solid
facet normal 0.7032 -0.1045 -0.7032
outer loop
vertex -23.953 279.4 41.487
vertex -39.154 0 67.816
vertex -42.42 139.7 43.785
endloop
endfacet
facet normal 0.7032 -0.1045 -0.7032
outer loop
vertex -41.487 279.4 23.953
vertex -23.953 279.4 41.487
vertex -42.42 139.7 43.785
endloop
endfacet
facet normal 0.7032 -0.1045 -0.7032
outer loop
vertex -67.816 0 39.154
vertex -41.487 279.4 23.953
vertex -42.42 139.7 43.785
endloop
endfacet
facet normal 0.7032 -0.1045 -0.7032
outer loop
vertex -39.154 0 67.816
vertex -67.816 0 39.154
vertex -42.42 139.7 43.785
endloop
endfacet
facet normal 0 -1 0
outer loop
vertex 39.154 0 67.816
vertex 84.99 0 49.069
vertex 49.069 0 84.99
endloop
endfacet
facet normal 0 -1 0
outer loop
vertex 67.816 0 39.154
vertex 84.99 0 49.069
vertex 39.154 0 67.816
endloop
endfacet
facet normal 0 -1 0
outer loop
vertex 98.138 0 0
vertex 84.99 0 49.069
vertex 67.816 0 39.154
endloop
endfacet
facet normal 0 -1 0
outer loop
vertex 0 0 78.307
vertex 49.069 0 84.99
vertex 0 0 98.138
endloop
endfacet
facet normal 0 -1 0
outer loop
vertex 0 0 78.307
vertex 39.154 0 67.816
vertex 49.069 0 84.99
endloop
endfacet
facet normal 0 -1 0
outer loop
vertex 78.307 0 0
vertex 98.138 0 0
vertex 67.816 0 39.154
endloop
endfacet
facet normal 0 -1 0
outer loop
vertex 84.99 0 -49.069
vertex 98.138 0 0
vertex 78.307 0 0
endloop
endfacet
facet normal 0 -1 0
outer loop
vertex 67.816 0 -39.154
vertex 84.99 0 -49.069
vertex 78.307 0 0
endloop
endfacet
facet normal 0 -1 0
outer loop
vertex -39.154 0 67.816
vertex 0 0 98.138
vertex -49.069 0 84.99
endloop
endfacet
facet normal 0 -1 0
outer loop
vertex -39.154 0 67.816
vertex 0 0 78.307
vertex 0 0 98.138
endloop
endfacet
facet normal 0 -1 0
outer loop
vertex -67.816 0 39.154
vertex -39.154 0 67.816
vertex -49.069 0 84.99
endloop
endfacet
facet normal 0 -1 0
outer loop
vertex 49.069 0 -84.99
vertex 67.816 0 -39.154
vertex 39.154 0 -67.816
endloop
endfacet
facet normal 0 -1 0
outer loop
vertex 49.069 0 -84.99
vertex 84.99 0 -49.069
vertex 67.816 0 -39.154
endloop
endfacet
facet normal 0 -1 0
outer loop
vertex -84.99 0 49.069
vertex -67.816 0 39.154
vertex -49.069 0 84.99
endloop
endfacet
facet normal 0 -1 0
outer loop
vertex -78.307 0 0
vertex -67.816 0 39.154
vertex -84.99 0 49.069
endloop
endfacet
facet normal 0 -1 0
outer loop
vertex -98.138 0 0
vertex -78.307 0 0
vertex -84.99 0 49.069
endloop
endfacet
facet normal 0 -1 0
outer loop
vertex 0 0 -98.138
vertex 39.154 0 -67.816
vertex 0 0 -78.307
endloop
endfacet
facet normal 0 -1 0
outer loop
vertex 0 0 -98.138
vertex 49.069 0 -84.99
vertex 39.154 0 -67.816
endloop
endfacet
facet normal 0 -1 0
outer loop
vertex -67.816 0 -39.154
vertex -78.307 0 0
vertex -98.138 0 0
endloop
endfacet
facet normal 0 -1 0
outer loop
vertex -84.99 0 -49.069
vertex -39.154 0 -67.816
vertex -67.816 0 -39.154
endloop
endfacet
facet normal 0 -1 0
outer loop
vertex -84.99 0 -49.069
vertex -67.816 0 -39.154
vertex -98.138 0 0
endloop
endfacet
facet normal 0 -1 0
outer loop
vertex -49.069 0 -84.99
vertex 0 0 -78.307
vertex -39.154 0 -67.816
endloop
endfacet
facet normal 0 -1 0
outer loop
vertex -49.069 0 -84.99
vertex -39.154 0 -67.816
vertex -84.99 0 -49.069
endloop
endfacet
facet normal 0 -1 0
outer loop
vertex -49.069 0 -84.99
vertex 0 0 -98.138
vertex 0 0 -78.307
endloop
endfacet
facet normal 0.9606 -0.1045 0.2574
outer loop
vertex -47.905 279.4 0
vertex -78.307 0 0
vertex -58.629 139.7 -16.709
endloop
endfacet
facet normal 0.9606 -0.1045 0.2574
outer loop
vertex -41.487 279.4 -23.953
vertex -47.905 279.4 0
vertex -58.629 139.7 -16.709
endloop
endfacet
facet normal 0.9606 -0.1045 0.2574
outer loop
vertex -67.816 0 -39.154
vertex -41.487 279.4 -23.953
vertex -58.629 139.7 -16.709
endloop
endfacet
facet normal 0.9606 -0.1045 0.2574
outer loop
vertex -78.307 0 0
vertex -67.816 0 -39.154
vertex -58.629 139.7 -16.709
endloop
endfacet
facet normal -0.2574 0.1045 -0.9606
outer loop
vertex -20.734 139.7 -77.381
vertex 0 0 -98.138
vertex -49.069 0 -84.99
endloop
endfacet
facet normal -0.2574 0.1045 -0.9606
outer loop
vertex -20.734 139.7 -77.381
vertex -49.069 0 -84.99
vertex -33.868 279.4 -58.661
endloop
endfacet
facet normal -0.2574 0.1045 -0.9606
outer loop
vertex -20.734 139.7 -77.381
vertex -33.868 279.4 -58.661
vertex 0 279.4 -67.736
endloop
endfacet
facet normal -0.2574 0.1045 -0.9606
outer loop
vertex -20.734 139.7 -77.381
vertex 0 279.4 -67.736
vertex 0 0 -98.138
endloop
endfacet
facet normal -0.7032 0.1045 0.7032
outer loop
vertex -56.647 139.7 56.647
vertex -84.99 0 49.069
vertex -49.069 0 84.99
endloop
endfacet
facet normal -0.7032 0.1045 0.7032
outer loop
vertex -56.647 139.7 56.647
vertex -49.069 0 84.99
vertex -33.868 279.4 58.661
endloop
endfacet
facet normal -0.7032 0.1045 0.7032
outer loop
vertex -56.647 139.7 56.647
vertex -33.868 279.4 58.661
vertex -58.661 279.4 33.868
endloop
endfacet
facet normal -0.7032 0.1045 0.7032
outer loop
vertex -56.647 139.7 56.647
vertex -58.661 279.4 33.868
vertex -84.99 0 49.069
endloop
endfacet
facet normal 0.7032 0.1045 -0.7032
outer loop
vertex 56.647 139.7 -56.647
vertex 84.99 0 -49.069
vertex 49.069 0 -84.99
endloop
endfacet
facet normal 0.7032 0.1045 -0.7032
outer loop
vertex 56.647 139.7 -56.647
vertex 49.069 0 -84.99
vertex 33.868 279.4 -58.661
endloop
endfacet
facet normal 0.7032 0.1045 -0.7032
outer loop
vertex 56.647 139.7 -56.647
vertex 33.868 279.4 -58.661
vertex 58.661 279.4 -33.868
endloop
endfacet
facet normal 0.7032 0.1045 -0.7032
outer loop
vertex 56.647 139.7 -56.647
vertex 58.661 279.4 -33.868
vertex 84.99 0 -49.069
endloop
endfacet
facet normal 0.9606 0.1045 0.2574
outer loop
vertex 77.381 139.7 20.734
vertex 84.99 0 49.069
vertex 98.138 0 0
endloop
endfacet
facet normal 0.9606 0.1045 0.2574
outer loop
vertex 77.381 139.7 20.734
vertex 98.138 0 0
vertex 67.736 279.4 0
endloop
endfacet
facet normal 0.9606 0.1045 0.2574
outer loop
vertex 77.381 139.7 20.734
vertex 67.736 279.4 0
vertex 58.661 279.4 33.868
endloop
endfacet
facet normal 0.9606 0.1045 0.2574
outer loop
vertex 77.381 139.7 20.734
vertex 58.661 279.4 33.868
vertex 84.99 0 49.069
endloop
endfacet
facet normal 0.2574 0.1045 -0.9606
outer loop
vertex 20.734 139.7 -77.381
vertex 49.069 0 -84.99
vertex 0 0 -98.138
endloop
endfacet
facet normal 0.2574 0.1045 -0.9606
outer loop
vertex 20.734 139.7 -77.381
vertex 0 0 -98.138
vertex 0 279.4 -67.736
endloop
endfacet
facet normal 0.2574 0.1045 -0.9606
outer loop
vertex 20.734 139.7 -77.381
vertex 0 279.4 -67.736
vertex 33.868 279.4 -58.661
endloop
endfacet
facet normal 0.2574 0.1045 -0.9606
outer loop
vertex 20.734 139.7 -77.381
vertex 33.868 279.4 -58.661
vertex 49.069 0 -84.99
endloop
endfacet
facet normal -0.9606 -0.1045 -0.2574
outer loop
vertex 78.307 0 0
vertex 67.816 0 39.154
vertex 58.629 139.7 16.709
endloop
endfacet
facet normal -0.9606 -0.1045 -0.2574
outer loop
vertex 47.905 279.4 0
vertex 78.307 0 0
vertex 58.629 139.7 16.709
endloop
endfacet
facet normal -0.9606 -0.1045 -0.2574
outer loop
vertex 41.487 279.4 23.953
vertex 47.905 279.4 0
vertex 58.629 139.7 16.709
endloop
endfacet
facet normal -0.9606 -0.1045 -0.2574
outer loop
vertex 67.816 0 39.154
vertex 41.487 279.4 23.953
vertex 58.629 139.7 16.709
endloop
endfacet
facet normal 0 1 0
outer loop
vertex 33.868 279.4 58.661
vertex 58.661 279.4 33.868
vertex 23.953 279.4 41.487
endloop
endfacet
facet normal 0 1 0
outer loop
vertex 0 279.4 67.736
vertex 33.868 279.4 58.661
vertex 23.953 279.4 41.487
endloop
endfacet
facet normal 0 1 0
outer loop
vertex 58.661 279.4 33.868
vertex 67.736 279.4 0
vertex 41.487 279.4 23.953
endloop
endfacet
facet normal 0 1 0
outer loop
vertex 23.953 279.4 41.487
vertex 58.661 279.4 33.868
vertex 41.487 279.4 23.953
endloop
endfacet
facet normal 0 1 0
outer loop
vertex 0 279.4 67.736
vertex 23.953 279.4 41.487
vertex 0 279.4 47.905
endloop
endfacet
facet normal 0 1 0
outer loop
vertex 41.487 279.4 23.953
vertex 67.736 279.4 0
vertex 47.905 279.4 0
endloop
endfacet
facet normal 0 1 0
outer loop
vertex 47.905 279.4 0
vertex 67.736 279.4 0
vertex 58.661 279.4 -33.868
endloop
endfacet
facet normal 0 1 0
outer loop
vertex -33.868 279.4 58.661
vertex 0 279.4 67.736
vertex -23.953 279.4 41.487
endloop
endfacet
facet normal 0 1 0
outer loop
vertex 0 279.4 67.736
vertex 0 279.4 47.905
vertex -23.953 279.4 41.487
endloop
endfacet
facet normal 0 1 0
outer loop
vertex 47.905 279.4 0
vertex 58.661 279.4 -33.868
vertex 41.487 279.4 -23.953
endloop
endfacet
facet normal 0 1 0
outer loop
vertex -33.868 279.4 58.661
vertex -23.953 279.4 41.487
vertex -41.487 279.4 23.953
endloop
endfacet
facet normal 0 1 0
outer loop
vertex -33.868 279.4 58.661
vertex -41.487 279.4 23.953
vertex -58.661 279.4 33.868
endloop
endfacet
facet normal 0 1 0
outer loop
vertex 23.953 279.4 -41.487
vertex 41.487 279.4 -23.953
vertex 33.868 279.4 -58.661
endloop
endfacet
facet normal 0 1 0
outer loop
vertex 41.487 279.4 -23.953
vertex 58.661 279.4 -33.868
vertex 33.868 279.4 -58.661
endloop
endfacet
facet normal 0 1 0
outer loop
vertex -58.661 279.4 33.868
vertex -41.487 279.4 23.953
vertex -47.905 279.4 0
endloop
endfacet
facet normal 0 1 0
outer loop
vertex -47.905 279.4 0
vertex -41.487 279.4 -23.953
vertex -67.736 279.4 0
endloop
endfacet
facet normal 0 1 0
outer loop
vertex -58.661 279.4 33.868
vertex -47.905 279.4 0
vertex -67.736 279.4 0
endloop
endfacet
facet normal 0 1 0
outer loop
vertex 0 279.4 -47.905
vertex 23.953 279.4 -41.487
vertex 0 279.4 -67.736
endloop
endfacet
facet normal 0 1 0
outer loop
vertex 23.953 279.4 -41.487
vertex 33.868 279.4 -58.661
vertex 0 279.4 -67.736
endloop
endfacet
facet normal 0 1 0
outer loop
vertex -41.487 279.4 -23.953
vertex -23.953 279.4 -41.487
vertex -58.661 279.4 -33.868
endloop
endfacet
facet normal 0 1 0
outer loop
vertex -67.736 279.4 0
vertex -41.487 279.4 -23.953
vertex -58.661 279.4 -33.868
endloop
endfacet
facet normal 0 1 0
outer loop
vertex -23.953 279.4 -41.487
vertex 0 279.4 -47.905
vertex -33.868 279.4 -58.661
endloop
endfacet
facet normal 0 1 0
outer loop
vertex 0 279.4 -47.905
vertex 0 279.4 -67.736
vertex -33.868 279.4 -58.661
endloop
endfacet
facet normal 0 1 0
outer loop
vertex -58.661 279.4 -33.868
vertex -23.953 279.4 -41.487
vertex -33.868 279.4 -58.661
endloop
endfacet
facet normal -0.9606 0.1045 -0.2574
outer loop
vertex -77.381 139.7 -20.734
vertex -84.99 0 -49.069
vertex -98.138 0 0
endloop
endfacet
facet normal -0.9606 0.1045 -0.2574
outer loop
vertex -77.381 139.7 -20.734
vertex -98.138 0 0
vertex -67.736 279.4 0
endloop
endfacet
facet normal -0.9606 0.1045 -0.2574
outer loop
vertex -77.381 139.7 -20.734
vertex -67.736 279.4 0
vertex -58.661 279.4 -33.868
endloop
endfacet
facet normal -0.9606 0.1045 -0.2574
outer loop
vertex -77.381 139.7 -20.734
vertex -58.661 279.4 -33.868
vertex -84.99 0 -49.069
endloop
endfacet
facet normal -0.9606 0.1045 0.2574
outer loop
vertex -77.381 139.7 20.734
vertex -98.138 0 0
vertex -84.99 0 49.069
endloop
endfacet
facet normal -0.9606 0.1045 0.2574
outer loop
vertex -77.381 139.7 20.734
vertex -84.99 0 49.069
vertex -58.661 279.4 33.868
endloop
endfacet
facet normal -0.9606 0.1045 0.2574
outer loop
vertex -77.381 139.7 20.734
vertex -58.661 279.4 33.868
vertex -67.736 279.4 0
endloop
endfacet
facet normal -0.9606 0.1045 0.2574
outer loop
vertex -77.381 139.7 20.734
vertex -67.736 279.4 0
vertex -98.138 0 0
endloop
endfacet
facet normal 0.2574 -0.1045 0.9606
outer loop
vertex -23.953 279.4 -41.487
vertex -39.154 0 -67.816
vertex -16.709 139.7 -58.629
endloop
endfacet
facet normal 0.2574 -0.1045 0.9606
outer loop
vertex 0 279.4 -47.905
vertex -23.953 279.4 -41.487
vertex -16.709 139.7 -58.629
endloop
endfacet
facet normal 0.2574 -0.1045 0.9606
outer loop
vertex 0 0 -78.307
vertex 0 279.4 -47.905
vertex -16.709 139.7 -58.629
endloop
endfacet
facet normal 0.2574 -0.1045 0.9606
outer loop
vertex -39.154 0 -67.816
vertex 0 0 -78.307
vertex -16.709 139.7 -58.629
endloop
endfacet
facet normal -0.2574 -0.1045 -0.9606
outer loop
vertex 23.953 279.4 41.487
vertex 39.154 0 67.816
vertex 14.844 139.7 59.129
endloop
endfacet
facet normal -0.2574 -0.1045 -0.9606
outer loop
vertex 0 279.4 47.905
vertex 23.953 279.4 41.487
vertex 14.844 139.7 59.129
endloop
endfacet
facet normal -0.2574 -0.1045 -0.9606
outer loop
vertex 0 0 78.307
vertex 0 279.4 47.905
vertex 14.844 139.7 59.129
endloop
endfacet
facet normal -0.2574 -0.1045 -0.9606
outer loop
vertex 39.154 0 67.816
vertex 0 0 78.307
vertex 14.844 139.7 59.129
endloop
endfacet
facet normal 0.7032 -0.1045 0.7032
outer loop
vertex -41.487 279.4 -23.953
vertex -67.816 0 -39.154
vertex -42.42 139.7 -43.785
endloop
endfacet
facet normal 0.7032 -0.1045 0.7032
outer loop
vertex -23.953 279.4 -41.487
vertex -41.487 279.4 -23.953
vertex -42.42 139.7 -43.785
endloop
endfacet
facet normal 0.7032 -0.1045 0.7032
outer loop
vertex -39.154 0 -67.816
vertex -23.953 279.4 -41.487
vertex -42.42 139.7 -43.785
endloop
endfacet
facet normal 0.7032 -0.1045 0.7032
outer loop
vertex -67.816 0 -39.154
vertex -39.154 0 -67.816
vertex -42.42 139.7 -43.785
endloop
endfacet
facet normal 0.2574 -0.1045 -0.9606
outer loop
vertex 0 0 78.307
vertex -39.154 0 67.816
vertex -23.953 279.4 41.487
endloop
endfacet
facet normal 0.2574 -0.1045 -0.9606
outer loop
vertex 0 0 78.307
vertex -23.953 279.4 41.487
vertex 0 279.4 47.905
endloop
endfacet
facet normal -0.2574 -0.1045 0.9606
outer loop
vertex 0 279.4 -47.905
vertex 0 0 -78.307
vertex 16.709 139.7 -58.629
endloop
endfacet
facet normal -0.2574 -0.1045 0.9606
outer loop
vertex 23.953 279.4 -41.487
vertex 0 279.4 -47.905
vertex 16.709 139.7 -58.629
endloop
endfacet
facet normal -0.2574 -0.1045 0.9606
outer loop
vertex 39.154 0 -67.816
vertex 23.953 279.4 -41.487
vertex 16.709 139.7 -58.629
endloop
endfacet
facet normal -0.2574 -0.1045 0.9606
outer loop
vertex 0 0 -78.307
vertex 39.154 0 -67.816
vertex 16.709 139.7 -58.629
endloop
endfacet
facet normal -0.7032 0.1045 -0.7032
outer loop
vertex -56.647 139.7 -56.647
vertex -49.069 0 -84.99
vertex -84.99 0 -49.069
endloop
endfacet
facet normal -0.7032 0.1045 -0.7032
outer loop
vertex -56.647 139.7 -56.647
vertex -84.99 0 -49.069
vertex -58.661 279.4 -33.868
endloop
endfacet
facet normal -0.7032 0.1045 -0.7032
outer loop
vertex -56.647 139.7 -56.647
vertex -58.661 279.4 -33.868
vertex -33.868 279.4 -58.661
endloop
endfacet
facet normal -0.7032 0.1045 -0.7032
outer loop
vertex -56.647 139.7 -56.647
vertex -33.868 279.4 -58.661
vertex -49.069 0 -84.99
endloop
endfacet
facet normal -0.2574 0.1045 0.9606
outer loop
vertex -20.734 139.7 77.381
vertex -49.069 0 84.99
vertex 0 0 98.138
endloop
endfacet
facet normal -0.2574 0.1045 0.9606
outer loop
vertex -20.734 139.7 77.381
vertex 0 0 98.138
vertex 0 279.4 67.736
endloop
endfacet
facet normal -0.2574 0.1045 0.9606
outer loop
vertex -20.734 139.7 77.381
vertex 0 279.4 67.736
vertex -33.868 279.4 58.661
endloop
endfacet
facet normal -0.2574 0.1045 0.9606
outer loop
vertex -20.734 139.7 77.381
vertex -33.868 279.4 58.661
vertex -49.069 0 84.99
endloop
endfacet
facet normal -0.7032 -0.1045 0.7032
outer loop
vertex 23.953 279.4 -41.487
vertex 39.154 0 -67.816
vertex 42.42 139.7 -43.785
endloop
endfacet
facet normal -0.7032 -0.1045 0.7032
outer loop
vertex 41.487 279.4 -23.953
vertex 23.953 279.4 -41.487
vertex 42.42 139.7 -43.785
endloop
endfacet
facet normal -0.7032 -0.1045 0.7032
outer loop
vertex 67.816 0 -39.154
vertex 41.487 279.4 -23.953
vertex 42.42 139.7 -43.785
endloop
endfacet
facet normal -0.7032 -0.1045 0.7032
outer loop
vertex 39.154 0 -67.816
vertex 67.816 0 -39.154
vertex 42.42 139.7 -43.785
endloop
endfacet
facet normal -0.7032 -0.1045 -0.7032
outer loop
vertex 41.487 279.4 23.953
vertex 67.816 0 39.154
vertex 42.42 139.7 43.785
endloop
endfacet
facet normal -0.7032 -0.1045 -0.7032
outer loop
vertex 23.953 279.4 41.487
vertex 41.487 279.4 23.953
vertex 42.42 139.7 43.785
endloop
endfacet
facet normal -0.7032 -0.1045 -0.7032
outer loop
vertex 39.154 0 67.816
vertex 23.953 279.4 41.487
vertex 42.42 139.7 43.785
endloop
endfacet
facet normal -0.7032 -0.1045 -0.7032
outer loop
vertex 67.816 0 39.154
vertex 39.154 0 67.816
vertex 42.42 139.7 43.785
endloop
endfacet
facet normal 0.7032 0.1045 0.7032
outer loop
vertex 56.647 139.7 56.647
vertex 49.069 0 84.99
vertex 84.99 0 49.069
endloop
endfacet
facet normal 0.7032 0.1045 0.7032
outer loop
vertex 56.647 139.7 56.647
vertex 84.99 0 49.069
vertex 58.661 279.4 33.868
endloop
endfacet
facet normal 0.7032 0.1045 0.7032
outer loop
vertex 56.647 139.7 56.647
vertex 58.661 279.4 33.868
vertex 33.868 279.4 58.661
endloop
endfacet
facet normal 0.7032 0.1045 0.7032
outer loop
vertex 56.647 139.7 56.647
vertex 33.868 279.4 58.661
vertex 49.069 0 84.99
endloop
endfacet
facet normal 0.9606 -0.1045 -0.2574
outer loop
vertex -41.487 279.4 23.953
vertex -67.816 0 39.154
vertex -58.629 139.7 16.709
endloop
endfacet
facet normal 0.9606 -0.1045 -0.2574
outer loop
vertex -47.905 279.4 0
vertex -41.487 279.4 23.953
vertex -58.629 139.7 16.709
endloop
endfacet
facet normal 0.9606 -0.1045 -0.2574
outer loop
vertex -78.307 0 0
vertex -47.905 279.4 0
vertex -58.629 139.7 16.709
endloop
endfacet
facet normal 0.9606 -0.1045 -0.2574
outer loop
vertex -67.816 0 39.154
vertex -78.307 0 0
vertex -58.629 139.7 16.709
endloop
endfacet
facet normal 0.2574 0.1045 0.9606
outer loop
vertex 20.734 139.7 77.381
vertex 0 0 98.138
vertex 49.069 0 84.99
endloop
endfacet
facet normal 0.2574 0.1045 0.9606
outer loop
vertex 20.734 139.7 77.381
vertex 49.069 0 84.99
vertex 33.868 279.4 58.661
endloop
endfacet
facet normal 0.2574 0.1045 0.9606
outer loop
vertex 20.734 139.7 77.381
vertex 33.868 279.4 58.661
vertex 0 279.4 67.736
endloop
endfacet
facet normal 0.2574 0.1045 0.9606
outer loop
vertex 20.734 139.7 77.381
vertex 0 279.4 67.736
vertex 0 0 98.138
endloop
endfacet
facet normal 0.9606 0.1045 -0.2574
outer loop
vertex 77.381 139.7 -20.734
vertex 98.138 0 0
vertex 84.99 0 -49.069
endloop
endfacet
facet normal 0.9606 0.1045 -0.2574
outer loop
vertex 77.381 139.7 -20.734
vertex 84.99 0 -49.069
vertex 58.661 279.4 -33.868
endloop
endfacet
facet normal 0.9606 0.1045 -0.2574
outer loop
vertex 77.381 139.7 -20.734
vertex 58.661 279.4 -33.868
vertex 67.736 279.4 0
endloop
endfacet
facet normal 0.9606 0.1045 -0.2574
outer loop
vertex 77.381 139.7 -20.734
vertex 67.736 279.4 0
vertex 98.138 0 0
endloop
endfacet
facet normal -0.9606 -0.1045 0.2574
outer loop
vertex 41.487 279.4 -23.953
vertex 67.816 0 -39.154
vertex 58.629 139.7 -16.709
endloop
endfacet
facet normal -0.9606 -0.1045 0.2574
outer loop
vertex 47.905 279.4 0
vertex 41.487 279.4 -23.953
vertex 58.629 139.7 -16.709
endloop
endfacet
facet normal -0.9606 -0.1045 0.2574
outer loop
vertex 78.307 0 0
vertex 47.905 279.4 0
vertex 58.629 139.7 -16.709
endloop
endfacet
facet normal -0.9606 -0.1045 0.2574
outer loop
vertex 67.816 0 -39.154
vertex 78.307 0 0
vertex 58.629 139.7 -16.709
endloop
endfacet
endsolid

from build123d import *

# Parameters (mm, degrees)
BOSS_EXTRUDE1_DEPTH = 279.4
BOSS_EXTRUDE1_TAPER = 6
SHELL1_T            = -19.05


with BuildPart() as part:
    # Sketch1 → Boss-Extrude1 (new body)
    with BuildSketch(Plane(origin=(0, 0, 0), x_dir=(1, 0, 0), z_dir=(0, 1, 0))):
        Polygon((98.138063951, 0), (84.99005646, 49.069031975), (49.069031975, 84.99005646), (0, 98.138063951), (-49.069031975, 84.99005646), (-84.99005646, 49.069031975), (-98.138063951, 0), (-84.99005646, -49.069031975), (-49.069031975, -84.99005646), (0, -98.138063951), (49.069031975, -84.99005646), (84.99005646, -49.069031975), align=None)
    extrude(amount=BOSS_EXTRUDE1_DEPTH, taper=BOSS_EXTRUDE1_TAPER)

    # Shell1
    shell1_openings = [part.faces().sort_by_distance(p)[0] for p in [
        (0, 279.4, 0),
        (0, 0, 0),
    ]]
    offset(amount=SHELL1_T, openings=shell1_openings, kind=Kind.INTERSECTION)


solid = part.part
